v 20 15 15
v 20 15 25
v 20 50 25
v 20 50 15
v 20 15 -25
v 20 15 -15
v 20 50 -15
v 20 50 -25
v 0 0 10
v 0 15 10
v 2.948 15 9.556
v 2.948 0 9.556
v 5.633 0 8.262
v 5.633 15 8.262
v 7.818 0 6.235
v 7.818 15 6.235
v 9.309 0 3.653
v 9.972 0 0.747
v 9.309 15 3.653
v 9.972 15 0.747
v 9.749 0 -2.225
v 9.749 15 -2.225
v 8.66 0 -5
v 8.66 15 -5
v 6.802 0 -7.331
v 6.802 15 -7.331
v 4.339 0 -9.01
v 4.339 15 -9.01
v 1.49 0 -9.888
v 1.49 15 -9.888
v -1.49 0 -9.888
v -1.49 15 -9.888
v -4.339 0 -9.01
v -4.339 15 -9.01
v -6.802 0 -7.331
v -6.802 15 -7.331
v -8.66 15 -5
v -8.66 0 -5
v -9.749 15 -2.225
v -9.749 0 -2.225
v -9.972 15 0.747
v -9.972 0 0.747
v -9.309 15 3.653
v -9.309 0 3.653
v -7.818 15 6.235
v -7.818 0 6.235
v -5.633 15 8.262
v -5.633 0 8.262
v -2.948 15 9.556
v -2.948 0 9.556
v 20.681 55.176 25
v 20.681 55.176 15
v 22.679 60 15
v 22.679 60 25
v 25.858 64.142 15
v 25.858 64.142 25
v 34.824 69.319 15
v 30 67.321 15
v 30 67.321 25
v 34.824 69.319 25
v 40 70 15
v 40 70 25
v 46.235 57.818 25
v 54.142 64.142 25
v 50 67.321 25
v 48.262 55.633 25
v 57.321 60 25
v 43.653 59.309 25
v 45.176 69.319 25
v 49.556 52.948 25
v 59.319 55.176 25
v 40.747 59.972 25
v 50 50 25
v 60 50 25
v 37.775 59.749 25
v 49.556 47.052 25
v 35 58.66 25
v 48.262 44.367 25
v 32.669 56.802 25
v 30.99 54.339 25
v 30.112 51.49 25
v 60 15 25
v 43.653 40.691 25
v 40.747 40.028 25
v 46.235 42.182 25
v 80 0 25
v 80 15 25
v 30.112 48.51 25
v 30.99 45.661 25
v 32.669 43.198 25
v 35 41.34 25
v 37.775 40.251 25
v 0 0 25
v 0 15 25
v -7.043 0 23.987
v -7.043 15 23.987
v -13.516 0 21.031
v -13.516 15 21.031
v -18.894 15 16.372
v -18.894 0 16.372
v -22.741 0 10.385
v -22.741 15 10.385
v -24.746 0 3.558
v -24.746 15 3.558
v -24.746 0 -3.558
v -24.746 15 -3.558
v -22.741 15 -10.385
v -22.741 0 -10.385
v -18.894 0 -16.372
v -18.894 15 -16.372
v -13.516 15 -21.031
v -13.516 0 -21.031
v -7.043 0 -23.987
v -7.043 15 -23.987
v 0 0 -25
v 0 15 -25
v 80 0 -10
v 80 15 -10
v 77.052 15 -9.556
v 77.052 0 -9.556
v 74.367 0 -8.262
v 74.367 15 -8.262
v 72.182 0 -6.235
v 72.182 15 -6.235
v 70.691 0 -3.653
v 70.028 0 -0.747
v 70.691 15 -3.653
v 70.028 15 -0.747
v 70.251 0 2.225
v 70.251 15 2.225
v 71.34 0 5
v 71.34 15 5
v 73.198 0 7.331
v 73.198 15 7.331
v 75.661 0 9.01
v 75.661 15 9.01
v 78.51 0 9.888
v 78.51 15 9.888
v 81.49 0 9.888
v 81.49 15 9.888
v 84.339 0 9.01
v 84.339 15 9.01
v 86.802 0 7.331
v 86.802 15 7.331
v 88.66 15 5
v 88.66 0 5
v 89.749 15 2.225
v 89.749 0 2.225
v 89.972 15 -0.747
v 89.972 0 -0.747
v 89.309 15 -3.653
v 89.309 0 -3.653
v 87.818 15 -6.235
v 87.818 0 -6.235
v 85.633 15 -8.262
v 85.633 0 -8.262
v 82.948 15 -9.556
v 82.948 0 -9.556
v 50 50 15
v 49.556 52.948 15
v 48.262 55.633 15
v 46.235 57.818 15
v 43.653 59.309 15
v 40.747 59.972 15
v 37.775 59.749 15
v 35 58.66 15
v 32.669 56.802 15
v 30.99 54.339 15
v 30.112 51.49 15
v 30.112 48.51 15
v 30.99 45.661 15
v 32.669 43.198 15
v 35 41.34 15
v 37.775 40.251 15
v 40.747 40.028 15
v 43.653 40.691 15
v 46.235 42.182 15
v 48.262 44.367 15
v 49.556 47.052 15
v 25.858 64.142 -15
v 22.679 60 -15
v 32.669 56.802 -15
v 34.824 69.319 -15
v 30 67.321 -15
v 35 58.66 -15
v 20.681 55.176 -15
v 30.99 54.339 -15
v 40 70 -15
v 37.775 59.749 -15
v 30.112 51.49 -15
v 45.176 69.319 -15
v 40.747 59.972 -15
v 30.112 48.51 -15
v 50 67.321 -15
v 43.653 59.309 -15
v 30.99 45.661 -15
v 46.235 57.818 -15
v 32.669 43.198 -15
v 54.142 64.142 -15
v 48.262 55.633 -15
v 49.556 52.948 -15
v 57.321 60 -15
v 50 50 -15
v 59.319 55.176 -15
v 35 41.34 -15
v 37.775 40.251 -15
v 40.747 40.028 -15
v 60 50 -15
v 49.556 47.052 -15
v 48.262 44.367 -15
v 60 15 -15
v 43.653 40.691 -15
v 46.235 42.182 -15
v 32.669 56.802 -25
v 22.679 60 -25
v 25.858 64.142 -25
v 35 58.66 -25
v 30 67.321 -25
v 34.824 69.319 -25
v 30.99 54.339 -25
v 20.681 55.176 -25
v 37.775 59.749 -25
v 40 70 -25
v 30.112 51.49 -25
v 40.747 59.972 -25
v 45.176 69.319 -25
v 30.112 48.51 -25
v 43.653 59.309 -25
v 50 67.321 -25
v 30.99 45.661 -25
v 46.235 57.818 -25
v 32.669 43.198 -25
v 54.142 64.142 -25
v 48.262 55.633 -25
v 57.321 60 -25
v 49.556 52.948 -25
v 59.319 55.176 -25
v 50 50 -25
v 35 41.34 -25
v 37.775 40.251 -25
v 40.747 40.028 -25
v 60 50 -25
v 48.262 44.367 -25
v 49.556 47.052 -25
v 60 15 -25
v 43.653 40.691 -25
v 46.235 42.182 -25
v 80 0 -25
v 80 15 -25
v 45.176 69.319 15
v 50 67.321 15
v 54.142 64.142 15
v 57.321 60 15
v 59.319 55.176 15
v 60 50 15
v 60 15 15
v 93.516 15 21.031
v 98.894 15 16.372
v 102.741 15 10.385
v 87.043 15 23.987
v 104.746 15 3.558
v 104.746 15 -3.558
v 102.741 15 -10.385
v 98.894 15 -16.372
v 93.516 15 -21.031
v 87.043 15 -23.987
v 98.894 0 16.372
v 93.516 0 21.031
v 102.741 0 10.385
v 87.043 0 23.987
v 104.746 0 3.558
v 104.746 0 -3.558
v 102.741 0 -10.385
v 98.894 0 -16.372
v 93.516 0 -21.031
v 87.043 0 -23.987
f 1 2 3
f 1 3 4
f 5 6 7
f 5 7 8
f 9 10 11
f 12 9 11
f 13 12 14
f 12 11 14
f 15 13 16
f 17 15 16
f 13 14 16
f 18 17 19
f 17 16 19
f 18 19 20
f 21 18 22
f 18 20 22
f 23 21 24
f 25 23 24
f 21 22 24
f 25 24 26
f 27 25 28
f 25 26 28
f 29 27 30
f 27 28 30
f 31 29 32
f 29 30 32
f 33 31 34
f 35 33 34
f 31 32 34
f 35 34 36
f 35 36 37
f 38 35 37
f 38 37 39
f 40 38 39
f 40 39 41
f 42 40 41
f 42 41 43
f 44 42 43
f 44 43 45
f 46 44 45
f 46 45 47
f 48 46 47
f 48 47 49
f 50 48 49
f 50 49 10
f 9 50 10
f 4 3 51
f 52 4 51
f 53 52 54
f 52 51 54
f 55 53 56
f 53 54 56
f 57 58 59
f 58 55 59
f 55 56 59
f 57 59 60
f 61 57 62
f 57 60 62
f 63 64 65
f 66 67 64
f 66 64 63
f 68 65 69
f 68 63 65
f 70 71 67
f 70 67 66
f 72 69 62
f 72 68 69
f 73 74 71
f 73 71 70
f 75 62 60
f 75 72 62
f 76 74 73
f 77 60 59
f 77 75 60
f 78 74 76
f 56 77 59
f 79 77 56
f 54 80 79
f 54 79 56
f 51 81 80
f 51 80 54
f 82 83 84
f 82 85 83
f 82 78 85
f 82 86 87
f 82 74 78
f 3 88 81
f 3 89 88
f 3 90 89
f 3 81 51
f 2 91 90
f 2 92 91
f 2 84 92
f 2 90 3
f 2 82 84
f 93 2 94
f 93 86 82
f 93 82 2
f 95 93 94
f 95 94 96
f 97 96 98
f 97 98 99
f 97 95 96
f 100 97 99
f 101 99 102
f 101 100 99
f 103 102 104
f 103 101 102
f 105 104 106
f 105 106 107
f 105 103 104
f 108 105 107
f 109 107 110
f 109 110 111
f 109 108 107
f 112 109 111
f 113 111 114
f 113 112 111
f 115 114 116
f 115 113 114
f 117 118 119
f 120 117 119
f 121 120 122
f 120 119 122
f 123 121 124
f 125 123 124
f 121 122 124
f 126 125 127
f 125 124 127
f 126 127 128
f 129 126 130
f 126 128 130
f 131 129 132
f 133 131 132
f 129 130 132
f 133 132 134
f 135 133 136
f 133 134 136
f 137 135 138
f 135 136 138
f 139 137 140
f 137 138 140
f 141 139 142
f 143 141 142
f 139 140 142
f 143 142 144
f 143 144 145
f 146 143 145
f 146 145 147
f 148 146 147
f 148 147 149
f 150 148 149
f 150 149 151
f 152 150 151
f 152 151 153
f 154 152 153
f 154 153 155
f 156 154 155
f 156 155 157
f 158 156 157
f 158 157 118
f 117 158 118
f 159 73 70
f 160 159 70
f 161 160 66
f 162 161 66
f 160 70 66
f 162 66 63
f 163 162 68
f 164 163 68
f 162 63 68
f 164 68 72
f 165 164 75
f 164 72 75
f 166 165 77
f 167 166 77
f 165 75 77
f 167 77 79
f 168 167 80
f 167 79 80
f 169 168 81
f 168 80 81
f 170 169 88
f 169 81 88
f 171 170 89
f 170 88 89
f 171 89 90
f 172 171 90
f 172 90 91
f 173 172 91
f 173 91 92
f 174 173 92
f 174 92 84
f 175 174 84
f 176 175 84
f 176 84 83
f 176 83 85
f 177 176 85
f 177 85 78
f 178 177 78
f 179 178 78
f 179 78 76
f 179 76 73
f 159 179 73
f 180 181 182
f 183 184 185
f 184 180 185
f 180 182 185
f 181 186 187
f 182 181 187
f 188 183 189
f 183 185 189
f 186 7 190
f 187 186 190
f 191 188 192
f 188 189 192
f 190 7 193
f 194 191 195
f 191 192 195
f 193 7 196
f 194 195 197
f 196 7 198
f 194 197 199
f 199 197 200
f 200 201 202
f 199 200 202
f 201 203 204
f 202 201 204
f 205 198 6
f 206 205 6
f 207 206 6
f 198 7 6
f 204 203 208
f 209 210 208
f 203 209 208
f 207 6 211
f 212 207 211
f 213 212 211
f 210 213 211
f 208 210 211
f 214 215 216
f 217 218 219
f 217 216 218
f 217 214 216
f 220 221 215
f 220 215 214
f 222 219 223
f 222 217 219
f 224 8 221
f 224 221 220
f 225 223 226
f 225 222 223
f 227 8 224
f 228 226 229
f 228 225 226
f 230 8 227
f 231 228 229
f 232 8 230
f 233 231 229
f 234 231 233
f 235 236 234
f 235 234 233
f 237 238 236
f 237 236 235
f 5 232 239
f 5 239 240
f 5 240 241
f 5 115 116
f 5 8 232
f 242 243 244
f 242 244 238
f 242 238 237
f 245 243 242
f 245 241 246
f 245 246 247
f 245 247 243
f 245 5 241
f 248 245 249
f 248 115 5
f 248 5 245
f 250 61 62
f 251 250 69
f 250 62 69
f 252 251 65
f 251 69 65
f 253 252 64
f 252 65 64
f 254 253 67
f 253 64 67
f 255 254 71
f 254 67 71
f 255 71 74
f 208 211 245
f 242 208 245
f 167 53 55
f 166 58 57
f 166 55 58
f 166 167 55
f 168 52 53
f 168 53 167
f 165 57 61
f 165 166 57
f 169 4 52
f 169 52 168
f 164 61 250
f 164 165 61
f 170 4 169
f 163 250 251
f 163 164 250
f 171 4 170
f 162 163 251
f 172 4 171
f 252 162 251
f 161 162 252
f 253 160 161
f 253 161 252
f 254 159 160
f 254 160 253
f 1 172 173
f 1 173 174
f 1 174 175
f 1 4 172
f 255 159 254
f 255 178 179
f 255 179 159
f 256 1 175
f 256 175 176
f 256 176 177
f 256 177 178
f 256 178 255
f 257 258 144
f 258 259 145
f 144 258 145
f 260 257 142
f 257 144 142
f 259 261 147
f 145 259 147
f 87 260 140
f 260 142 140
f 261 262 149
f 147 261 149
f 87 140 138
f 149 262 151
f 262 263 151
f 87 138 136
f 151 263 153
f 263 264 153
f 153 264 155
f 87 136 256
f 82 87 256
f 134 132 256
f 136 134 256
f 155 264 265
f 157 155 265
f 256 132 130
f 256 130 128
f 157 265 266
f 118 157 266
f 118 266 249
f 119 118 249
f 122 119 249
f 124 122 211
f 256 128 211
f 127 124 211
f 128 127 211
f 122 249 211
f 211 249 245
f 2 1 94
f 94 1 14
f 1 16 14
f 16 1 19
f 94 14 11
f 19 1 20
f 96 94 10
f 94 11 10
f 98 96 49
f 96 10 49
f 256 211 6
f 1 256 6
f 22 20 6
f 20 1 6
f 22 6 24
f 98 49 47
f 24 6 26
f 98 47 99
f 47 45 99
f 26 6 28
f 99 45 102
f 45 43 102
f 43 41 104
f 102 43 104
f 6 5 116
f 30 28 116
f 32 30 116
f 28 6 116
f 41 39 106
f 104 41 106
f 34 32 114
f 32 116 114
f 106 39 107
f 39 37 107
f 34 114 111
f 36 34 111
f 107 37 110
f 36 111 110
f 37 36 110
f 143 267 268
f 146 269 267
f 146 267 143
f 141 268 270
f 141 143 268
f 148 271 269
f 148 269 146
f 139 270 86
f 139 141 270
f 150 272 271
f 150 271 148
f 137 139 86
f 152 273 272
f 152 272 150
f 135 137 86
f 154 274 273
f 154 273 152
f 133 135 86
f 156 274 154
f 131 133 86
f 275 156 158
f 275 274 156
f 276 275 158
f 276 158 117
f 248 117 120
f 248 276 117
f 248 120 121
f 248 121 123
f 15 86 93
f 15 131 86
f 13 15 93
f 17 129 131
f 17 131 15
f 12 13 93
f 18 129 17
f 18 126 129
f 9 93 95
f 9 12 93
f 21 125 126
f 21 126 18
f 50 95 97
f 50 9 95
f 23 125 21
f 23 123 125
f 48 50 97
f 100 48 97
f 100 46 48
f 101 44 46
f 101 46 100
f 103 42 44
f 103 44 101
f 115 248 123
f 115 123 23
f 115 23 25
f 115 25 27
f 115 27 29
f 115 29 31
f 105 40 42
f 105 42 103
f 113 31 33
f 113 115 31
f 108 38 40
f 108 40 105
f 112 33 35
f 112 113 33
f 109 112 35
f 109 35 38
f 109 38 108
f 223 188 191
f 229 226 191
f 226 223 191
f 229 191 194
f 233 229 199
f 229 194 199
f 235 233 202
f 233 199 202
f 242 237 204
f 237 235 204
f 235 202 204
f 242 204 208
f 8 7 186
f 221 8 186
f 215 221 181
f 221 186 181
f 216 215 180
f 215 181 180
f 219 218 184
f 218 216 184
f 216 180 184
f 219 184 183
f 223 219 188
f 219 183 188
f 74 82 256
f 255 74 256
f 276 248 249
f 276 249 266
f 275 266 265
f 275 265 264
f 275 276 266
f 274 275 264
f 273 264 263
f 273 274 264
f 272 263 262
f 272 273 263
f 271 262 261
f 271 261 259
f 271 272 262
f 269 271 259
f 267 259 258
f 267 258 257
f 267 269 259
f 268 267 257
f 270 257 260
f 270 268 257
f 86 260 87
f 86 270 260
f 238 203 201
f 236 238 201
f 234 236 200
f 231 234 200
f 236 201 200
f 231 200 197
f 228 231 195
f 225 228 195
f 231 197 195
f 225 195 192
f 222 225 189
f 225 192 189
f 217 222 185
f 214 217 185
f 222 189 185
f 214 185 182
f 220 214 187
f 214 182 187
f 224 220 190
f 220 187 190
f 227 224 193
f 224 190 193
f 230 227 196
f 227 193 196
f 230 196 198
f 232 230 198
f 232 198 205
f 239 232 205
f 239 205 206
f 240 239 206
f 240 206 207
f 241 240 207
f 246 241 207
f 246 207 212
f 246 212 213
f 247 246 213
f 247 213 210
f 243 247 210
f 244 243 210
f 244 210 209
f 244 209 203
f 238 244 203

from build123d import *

# Parameters (mm, degrees)
BOSS_EXTRUDE1_DEPTH     = 15
SKETCH2_R               = 10
CUT_EXTRUDE1_DEPTH      = 109.972473589
SKETCH3_W               = 40
SKETCH3_H               = 10
BOSS_EXTRUDE2_DEPTH     = 55
CUT_EXTRUDE2_DEPTH      = 136.738719605
CUT_EXTRUDE2_DEPTH_BACK = 136.738719605


with BuildPart() as part:
    # Sketch1 → Boss-Extrude1 (new body)
    with BuildSketch(Plane(origin=(0, 0, 0), x_dir=(1, 0, 0), z_dir=(0, 1, 0))):
        with BuildLine():
            Line((0, 25), (80, 25))
            ThreePointArc((80, 25), (105, 0), (80, -25))
            Line((80, -25), (0, -25))
            ThreePointArc((0, -25), (-25, 0), (0, 25))
        make_face()
    extrude(amount=BOSS_EXTRUDE1_DEPTH)

    # Sketch2 → Cut-Extrude1 (cut, through all)
    with BuildSketch(Plane(origin=(0, 15, 0), x_dir=(1, 0, 0), z_dir=(0, 1, 0))):
        with Locations(Location((0, 0, 0), (0, 0, 270))):
            Circle(SKETCH2_R)
        with Locations(Location((80, 0, 0), (0, 0, 90))):
            Circle(SKETCH2_R)
    extrude(amount=-CUT_EXTRUDE1_DEPTH, mode=Mode.SUBTRACT)

    # Sketch3 → Boss-Extrude2 (add)
    with BuildSketch(Plane(origin=(0, 15, 0), x_dir=(1, 0, 0), z_dir=(0, 1, 0))):
        with Locations((40, 20)):
            Rectangle(SKETCH3_W, SKETCH3_H)
        with Locations((40, -20)):
            Rectangle(SKETCH3_W, SKETCH3_H)
    extrude(amount=BOSS_EXTRUDE2_DEPTH)

    # Sketch4 → Cut-Extrude2 (cut, two sides)
    with BuildSketch(Plane.XY.offset(25)) as cut_extrude2_sk:
        with BuildLine():
            ThreePointArc((30, 50), (40, 40), (50, 50))
            Line((50, 50), (30, 50))
        make_face()
        with BuildLine():
            Line((30, 50), (50, 50))
            ThreePointArc((50, 50), (40, 60), (30, 50))
        make_face()
        with BuildLine():
            ThreePointArc((40, 70), (54.142135624, 64.142135624), (60, 50))
            Line((60, 50), (60, 70))
            Line((60, 70), (40, 70))
        make_face()
        with BuildLine():
            ThreePointArc((20, 50), (25.857864376, 64.142135624), (40, 70))
            Line((40, 70), (20, 70))
            Line((20, 70), (20, 50))
        make_face()
    extrude(amount=CUT_EXTRUDE2_DEPTH, mode=Mode.SUBTRACT)
    extrude(cut_extrude2_sk.sketch, amount=-CUT_EXTRUDE2_DEPTH_BACK, mode=Mode.SUBTRACT)


solid = part.part
